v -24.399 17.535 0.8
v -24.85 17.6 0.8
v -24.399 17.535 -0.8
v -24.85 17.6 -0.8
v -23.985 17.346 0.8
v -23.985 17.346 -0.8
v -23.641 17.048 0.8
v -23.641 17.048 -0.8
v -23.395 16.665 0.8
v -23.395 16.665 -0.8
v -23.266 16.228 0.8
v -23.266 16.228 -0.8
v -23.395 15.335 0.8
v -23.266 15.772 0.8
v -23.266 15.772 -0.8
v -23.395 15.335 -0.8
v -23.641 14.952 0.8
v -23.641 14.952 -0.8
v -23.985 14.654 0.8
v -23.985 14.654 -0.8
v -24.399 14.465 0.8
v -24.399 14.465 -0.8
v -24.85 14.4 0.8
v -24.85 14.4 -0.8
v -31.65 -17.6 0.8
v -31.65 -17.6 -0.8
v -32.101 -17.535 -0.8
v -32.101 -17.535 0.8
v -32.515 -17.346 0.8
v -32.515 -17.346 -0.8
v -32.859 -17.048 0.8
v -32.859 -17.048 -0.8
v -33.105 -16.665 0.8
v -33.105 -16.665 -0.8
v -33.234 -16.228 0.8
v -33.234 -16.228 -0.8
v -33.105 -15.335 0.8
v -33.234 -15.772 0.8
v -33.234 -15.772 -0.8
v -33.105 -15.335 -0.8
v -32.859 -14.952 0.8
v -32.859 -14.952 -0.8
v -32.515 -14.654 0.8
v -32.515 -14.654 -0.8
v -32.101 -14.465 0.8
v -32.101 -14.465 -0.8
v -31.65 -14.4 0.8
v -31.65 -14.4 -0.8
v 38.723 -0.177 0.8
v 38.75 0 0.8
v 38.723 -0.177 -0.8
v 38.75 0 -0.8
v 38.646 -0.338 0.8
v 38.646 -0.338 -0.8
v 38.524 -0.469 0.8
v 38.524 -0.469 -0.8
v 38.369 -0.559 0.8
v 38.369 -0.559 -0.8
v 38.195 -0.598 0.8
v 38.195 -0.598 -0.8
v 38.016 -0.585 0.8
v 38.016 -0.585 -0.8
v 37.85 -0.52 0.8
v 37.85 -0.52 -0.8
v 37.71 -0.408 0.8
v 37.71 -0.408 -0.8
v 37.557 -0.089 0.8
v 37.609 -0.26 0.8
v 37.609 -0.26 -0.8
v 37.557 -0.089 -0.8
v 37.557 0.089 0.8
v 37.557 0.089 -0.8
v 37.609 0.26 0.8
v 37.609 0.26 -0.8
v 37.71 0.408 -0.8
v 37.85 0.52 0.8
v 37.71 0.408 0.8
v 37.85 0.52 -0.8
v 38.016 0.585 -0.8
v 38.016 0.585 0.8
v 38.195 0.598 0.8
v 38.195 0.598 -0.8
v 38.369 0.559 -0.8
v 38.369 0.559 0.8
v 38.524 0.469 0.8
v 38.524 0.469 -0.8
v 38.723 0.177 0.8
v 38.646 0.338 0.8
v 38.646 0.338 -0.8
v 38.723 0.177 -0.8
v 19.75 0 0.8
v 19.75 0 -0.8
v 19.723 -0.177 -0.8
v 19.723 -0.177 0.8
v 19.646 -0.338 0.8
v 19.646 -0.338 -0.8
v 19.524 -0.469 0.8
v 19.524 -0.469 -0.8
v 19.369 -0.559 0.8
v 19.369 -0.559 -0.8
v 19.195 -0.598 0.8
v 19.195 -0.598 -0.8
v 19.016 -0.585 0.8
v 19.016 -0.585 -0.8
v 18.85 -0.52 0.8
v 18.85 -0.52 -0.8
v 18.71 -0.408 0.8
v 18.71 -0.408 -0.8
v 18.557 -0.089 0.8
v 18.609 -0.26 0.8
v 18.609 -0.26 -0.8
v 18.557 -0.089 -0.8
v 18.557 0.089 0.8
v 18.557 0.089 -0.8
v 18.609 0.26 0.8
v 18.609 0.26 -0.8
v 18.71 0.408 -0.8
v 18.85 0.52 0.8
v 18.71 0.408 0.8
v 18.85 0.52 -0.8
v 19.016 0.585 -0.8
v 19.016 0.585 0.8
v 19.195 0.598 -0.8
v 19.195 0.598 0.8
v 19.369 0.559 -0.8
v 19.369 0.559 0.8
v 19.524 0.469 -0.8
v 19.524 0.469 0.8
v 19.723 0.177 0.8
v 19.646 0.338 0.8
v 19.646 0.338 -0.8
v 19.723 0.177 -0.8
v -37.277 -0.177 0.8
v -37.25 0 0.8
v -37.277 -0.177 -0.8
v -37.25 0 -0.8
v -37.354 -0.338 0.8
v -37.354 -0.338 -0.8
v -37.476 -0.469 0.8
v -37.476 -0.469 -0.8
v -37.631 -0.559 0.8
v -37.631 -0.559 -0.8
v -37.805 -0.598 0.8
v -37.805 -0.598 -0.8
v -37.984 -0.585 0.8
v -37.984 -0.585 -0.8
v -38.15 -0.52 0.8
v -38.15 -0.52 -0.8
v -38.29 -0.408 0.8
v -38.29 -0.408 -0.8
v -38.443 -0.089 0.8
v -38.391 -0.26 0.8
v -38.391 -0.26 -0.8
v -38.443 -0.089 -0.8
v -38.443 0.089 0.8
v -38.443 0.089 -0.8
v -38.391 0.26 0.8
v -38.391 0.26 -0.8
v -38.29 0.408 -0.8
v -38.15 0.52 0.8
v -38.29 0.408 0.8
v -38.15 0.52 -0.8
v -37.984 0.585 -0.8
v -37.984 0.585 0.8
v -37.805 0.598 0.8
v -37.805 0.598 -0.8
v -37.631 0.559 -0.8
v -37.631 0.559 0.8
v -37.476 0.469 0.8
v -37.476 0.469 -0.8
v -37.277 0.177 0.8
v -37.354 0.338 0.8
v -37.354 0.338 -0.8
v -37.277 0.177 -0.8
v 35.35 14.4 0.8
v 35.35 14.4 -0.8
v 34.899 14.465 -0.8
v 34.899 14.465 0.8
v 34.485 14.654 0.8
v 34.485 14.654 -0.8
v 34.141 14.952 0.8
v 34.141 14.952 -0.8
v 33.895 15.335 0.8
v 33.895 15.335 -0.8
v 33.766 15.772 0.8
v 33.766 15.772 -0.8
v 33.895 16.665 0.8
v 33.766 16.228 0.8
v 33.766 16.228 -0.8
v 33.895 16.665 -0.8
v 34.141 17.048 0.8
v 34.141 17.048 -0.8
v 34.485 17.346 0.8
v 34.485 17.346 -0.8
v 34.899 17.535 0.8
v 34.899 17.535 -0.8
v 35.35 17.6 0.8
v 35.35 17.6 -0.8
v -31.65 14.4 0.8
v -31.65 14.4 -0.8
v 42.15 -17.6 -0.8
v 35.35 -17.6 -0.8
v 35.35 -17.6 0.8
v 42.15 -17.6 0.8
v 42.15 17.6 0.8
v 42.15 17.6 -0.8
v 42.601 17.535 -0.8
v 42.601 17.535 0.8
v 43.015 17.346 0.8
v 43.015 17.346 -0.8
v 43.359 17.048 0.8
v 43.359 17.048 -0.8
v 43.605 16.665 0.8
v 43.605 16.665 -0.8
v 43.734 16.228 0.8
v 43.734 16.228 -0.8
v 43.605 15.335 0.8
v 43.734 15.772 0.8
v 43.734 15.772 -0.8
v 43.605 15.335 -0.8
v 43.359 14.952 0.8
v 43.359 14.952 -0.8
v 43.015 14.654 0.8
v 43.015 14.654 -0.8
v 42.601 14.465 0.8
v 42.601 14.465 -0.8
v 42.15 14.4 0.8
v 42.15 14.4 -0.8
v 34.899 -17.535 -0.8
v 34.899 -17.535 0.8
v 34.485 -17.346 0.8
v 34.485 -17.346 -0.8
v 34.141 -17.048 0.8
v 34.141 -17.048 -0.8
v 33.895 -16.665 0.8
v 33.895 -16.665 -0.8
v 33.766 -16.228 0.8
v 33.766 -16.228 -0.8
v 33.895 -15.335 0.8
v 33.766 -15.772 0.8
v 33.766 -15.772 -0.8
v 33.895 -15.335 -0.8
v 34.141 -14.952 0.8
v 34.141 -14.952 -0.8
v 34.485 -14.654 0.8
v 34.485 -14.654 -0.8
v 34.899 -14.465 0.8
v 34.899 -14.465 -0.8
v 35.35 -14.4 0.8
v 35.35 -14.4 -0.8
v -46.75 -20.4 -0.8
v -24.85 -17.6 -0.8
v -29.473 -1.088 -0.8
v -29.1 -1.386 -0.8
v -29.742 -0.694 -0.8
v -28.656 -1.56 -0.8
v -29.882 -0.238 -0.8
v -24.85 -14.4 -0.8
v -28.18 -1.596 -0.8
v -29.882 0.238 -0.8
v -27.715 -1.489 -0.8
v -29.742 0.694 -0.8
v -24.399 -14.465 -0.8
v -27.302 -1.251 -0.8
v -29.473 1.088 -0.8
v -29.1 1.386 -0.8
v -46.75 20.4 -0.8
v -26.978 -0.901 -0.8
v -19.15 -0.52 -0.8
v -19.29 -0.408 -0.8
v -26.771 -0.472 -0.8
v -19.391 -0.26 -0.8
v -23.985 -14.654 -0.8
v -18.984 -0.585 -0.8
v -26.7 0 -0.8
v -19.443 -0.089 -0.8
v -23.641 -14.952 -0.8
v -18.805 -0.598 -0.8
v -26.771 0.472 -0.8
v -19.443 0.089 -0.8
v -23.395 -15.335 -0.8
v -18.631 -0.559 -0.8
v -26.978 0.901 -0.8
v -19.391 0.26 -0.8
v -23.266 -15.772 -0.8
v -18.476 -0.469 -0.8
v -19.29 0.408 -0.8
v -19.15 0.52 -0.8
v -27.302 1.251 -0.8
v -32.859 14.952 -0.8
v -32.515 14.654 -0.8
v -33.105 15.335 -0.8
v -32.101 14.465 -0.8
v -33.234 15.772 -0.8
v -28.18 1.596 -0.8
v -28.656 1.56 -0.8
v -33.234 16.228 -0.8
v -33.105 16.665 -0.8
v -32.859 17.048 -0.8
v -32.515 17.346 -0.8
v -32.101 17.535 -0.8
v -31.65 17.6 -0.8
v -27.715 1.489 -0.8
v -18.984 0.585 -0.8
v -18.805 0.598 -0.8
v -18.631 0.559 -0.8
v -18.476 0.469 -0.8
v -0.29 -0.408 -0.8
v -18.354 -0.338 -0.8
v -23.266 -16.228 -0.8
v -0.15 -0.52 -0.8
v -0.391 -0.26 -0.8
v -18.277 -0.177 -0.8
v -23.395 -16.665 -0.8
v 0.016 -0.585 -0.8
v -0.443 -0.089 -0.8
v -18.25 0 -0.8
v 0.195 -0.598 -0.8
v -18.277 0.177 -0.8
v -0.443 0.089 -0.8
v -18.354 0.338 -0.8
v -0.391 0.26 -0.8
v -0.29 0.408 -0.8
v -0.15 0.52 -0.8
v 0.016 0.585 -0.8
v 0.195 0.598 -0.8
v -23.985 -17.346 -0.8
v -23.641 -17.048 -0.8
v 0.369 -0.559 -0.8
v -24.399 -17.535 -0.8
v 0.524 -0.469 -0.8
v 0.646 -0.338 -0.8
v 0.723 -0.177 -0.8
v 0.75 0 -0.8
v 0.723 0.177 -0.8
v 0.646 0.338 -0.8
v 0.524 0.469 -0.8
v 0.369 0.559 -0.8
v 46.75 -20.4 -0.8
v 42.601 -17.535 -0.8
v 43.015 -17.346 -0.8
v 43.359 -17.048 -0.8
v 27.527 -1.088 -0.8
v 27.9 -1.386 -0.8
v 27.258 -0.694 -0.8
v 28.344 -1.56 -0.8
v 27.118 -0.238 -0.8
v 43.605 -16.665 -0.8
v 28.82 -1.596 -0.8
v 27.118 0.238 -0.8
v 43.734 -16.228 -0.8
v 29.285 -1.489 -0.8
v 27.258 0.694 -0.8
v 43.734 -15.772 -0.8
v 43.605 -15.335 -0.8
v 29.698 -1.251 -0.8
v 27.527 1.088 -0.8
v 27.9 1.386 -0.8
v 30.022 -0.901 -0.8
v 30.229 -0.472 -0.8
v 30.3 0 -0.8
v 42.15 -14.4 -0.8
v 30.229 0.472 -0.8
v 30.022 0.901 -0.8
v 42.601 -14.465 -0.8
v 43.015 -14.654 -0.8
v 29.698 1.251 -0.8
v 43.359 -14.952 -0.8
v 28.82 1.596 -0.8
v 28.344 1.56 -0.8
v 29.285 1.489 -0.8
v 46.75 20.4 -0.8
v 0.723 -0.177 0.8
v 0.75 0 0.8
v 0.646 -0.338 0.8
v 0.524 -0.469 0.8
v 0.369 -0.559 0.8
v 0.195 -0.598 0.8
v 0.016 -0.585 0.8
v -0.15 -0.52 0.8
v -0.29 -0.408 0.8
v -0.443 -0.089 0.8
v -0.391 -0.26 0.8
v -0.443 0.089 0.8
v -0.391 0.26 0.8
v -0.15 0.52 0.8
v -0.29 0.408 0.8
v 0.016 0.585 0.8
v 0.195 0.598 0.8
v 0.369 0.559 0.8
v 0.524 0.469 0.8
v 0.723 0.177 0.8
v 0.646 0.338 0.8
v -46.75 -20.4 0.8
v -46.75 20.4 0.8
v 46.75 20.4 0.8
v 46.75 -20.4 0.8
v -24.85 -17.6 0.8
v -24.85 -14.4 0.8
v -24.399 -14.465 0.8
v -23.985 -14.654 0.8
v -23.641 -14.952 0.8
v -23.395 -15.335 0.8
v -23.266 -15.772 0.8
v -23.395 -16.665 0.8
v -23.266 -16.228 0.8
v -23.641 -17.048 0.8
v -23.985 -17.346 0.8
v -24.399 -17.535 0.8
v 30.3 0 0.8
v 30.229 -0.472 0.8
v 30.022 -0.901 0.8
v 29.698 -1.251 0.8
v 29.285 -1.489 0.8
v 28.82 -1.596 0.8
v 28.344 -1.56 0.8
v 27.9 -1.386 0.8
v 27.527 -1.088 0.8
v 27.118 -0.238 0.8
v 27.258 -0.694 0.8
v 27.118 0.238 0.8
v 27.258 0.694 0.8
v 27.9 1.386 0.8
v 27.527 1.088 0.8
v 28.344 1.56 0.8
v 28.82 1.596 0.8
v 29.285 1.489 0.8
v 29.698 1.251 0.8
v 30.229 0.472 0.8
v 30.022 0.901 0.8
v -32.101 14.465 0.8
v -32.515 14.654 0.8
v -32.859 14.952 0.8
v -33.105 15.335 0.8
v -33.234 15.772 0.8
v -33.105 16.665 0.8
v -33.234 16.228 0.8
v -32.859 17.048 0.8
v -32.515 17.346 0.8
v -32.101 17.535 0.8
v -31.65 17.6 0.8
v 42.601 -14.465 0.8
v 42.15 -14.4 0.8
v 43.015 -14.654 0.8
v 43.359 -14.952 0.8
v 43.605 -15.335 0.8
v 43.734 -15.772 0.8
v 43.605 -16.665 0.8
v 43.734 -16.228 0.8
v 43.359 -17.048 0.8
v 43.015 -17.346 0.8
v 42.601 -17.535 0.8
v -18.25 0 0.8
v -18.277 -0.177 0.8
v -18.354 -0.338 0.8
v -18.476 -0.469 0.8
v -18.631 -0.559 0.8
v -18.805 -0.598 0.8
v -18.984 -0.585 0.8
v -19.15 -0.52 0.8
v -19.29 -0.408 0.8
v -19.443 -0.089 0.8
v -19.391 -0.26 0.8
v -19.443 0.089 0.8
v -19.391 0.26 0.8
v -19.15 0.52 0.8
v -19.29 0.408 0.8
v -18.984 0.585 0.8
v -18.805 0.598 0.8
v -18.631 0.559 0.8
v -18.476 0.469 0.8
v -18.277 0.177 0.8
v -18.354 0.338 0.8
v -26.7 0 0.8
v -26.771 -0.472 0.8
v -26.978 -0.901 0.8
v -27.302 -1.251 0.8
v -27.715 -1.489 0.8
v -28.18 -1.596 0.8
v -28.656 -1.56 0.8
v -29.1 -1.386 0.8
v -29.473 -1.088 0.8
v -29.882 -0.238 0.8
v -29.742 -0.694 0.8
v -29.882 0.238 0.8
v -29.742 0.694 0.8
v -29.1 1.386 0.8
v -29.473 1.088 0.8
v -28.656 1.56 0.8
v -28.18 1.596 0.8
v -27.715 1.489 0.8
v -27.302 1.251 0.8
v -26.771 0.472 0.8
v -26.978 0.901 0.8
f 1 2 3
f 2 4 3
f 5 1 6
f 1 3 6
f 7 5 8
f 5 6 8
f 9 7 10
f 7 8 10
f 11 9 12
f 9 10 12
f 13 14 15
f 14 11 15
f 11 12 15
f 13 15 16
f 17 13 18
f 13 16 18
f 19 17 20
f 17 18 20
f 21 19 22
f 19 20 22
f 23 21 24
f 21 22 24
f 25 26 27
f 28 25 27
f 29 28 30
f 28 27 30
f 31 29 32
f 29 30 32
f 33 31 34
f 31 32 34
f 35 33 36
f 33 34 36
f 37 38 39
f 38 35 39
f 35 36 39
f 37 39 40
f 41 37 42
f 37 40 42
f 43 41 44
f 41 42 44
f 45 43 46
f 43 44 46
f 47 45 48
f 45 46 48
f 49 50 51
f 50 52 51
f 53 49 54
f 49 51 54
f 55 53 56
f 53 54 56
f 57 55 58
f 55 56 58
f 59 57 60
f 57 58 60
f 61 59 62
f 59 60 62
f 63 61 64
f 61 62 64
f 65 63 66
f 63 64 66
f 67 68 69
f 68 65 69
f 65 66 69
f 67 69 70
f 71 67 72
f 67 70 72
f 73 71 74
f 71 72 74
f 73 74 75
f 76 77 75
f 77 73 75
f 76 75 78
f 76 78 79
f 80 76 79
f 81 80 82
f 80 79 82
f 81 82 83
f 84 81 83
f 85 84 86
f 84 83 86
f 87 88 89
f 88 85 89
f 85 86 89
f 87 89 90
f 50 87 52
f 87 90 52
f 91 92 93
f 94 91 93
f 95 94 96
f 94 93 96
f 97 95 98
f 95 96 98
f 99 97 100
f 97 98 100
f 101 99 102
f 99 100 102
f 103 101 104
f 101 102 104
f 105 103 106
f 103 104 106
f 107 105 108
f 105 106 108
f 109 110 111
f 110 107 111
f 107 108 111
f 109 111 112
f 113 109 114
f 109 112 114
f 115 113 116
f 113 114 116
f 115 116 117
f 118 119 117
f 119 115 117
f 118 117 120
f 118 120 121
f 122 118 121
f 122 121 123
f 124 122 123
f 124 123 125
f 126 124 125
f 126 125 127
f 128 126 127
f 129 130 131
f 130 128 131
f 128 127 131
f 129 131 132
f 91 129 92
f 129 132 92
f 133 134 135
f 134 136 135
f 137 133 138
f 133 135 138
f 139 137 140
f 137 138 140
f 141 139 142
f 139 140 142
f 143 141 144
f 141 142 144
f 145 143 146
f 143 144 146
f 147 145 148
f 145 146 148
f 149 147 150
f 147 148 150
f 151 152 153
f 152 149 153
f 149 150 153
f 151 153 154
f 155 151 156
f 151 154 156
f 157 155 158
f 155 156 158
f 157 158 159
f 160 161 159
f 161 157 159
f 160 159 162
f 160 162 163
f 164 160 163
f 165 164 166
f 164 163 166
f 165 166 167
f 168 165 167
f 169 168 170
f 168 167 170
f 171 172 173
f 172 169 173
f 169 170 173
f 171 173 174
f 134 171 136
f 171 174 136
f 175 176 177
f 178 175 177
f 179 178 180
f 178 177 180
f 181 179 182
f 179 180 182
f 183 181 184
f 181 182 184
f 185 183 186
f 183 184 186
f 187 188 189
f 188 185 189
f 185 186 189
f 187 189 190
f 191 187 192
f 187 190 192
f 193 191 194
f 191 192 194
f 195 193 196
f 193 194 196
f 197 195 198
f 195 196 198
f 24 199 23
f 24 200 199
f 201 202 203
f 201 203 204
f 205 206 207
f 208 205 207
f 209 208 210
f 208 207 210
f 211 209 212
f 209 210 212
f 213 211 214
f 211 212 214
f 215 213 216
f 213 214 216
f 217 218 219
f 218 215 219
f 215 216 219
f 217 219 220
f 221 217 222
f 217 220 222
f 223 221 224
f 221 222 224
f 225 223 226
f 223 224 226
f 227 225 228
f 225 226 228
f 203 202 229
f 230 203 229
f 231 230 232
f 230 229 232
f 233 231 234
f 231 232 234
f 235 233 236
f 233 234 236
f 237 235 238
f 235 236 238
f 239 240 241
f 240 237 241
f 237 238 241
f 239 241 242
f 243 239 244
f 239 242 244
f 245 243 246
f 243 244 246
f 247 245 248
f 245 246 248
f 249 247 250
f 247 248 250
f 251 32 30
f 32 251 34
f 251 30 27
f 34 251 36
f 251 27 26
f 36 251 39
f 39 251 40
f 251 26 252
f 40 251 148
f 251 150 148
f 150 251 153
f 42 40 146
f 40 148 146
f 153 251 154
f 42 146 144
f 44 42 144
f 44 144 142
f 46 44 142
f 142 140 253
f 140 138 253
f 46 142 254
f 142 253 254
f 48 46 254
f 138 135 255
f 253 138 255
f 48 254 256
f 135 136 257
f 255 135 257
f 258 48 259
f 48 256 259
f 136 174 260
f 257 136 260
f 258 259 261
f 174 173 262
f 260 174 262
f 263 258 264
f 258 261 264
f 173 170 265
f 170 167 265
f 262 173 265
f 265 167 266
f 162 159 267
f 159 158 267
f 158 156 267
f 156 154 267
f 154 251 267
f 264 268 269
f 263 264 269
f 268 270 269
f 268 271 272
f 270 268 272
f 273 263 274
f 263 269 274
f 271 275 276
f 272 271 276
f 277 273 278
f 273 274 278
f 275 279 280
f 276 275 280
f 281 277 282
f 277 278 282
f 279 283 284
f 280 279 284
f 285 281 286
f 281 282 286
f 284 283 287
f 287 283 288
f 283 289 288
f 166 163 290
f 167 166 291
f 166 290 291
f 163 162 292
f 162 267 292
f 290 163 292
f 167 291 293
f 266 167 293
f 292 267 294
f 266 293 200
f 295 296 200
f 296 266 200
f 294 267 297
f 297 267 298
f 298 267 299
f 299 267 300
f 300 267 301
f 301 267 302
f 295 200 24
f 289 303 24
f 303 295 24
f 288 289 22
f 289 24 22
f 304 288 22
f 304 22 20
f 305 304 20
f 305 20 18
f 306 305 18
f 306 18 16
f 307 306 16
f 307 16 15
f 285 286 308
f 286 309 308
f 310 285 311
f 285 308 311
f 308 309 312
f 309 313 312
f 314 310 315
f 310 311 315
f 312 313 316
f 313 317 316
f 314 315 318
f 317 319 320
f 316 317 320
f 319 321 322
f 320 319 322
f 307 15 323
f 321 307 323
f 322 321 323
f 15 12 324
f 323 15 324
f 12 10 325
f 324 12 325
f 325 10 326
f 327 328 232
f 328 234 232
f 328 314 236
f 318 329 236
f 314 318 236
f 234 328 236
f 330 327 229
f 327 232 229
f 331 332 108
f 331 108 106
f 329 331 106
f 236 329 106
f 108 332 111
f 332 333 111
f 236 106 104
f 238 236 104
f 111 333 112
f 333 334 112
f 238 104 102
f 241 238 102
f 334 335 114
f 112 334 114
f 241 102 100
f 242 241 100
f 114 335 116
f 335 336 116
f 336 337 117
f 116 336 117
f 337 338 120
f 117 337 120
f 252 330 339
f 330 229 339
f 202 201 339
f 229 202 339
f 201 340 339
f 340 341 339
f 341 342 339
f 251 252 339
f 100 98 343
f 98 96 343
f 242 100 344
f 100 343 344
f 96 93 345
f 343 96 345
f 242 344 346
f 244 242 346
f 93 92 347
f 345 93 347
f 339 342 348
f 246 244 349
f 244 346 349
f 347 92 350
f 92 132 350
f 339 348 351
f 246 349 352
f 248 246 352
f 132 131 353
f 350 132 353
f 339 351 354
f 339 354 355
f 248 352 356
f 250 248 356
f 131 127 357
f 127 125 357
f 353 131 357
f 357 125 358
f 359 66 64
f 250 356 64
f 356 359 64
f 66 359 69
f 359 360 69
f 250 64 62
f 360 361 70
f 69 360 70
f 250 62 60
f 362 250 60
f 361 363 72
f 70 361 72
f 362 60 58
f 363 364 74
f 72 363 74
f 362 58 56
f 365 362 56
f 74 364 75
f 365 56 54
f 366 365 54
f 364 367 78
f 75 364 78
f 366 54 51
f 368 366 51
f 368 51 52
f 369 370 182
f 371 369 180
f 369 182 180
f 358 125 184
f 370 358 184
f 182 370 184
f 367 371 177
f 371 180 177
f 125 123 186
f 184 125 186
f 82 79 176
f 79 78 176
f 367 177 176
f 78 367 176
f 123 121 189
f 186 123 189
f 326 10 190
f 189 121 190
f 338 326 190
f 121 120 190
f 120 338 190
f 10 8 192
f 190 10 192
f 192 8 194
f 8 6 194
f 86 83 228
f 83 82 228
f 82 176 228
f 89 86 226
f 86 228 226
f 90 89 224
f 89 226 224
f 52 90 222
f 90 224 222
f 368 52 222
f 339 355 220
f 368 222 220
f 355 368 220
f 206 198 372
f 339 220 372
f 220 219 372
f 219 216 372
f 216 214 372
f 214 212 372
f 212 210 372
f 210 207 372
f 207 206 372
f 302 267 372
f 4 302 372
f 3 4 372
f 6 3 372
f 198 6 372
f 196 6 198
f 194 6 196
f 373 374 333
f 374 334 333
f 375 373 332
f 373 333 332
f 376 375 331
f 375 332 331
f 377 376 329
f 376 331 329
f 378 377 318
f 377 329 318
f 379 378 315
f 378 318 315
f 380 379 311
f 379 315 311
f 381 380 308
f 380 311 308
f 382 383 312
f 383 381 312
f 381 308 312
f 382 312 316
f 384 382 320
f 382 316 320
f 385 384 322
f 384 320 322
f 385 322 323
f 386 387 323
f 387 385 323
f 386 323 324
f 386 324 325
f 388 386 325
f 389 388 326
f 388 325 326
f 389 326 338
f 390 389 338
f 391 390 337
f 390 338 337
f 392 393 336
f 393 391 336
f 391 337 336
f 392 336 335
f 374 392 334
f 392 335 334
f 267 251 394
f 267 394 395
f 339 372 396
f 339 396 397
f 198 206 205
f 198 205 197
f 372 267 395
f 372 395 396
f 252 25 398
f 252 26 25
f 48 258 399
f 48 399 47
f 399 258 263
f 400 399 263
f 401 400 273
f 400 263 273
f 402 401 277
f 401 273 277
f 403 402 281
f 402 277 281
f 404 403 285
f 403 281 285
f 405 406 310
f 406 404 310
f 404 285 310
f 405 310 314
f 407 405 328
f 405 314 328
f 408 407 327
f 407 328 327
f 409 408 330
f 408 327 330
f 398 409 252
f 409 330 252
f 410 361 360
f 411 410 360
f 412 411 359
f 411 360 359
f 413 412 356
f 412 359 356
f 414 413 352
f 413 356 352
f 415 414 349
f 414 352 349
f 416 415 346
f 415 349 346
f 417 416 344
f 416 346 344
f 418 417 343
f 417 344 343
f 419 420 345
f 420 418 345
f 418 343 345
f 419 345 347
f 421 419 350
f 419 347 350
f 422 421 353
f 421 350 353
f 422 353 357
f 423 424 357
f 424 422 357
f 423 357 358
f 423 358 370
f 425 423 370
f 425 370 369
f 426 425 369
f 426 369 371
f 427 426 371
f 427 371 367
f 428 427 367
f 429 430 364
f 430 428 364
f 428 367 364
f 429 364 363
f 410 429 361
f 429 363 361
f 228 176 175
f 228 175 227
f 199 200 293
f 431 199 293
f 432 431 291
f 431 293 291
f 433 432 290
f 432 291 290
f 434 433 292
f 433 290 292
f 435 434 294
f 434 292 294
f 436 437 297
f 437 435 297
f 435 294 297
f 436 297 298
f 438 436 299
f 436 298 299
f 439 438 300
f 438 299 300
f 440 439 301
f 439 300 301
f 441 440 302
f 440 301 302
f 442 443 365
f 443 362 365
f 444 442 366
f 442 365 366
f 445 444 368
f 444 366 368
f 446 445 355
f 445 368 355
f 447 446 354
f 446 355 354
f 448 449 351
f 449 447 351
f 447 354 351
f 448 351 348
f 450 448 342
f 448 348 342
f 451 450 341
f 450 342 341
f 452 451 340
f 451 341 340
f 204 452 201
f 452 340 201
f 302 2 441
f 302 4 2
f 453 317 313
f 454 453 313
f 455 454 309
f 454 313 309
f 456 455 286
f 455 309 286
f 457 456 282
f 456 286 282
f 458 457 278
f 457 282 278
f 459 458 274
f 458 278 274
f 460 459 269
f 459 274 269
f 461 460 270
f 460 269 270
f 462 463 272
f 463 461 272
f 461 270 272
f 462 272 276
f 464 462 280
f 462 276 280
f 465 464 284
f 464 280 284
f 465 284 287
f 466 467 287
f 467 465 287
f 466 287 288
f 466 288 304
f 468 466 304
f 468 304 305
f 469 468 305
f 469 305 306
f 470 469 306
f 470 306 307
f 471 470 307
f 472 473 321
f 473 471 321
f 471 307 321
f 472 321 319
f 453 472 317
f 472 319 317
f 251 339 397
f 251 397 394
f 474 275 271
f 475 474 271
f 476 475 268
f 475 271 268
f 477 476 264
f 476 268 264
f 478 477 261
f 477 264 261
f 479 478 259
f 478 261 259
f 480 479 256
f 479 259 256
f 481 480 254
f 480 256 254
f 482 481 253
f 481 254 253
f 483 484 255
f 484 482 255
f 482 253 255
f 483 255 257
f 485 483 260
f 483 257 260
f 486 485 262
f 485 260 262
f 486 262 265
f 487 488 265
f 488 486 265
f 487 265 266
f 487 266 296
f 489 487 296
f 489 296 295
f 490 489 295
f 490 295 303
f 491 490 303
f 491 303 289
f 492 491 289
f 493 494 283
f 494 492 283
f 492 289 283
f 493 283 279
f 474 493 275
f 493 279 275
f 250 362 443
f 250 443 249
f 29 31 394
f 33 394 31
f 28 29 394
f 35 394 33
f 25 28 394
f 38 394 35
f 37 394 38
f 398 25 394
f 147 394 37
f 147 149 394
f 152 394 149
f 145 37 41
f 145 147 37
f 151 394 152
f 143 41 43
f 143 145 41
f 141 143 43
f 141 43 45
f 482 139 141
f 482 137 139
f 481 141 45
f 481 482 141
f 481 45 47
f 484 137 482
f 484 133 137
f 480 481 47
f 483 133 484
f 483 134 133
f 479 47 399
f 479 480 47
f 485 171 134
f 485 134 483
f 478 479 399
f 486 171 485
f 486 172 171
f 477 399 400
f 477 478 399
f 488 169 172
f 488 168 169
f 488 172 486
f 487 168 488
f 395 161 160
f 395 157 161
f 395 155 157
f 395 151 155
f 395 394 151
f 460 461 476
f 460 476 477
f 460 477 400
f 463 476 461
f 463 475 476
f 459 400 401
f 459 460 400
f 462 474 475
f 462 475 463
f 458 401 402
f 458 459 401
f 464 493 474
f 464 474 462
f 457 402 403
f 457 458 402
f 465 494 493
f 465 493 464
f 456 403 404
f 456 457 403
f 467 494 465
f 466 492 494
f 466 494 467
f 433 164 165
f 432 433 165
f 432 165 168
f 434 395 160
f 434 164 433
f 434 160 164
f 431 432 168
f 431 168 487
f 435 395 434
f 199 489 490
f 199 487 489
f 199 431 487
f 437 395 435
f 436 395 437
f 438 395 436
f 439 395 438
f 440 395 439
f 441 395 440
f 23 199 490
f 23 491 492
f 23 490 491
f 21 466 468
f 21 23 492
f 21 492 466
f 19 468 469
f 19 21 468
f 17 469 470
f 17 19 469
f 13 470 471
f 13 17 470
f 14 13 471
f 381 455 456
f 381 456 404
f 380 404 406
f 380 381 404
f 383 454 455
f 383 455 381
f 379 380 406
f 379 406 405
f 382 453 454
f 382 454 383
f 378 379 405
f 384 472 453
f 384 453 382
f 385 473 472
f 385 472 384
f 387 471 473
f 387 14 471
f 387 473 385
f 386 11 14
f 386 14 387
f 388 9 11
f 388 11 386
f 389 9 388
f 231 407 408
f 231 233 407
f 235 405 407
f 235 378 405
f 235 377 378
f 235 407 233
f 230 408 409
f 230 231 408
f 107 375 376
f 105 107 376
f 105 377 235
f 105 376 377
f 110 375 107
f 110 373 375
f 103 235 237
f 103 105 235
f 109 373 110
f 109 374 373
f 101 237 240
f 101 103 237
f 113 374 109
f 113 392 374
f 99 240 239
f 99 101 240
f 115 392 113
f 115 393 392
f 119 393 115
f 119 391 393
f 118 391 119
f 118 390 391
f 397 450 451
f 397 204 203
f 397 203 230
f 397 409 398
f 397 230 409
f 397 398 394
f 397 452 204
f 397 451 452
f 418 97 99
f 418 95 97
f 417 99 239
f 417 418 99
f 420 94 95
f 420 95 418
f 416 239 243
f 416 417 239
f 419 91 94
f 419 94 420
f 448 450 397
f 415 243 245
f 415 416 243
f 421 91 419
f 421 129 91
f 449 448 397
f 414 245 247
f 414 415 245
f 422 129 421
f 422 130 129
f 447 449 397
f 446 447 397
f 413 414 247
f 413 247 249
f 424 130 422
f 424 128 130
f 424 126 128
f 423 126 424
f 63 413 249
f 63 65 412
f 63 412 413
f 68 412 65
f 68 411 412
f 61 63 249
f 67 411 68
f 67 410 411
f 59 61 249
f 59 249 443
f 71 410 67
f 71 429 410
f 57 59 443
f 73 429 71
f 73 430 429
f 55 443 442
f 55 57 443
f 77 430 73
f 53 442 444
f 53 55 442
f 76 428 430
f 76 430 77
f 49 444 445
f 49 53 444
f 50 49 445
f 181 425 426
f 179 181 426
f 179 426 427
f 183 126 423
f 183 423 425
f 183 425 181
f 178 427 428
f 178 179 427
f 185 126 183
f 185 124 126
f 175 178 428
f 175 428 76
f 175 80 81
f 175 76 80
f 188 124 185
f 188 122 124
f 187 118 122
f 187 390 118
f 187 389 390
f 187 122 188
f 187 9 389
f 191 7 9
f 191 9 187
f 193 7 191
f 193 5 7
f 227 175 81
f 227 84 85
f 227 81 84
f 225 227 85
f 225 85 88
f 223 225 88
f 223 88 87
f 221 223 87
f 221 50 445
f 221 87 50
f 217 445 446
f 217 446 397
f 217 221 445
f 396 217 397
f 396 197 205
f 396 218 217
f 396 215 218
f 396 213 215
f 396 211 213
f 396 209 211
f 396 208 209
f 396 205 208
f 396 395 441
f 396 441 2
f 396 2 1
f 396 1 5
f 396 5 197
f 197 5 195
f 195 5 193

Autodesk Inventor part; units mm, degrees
ref_plane "YZ Plane" through (0, 0, 0) normal (1, 0, 0) x (0, 1, 0)
ref_plane "XZ Plane" through (0, 0, 0) normal (0, 1, 0) x (-1, 0, 0)
ref_plane "XY Plane" through (0, 0, 0) normal (0, 0, 1) x (1, 0, 0)
sketch "Sketch1" plane through (0, 0, 0) normal (0, 0, 1) x (1, 0, 0)
  line L0 (-46.75, 20.4) -> (46.75, 20.4)
  line L1 (46.75, 20.4) -> (46.75, -20.4)
  line L2 (46.75, -20.4) -> (-46.75, -20.4)
  line L3 (-46.75, -20.4) -> (-46.75, 20.4)
  line L4 (-31.65, 16) -> (-24.85, 16) construction
  line L5 (-31.65, 14.4) -> (-24.85, 14.4)
  line L6 (-24.85, 17.6) -> (-31.65, 17.6)
  arc A0 (-31.65, 17.6) -> (-31.65, 14.4) centre (-31.65, 16) ccw
  arc A1 (-24.85, 14.4) -> (-24.85, 17.6) centre (-24.85, 16) ccw
  line L7 (-31.65, -16) -> (-24.85, -16) construction
  line L8 (-31.65, -17.6) -> (-24.85, -17.6)
  line L9 (-24.85, -14.4) -> (-31.65, -14.4)
  arc A2 (-31.65, -14.4) -> (-31.65, -17.6) centre (-31.65, -16) ccw
  arc A3 (-24.85, -17.6) -> (-24.85, -14.4) centre (-24.85, -16) ccw
  line L10 (35.35, 16) -> (42.15, 16) construction
  line L11 (35.35, 14.4) -> (42.15, 14.4)
  line L12 (42.15, 17.6) -> (35.35, 17.6)
  arc A4 (35.35, 17.6) -> (35.35, 14.4) centre (35.35, 16) ccw
  arc A5 (42.15, 14.4) -> (42.15, 17.6) centre (42.15, 16) ccw
  line L13 (35.35, -16) -> (42.15, -16) construction
  line L14 (35.35, -17.6) -> (42.15, -17.6)
  line L15 (42.15, -14.4) -> (35.35, -14.4)
  arc A6 (35.35, -14.4) -> (35.35, -17.6) centre (35.35, -16) ccw
  arc A7 (42.15, -17.6) -> (42.15, -14.4) centre (42.15, -16) ccw
  line L16 (-28.25, 16) -> (-28.25, -16) construction
  line L17 (-28.25, -16) -> (38.75, -16) construction
  circle A8 centre (28.7, 0) radius 1.6
  circle A9 centre (-28.3, 0) radius 1.6
  circle A10 centre (38.15, 0) radius 0.6
  circle A11 centre (19.15, 0) radius 0.6
  circle A12 centre (0.15, 0) radius 0.6
  circle A13 centre (-18.85, 0) radius 0.6
  circle A14 centre (-37.85, 0) radius 0.6
  point P0 (0, 0)
  point P1 (0, 20.4)
  point P2 (-46.75, 0)
  point P3 (38.75, 16)
  point P4 (-28.25, 0)
  dimension "d0" = 40.8
  dimension "d1" = 93.5
  dimension "d2" = 3.2
  dimension "d3" = 3.2
  dimension "d4" = 3.2
  dimension "d5" = 3.2
  dimension "d6" = 32
  dimension "d7" = 67
  dimension "d8" = 4.6
  dimension "d9" = 6.8
  dimension "d10" = 3.2
  dimension "d11" = 57
  dimension "d13" = 1.2
  dimension "d14" = 8.6
  dimension "d15" = 1.2
  dimension "d16" = 1.2
  dimension "d17" = 1.2
  dimension "d18" = 1.2
  dimension "d20" = 19
  dimension "d21" = 19
  dimension "d22" = 19
  dimension "d23" = 19
  dimension "d27" = 18.05
extrude "PCB SiPM 4CH corta" add sketch "Sketch1" along normal mid plane 1.6
equation "\"d21\" = d20"
equation "\"d22\" = d20"
equation "\"d23\" = d20"
properties part number "PCB SiPM 4CH corta" material "Phenolic Resin"
